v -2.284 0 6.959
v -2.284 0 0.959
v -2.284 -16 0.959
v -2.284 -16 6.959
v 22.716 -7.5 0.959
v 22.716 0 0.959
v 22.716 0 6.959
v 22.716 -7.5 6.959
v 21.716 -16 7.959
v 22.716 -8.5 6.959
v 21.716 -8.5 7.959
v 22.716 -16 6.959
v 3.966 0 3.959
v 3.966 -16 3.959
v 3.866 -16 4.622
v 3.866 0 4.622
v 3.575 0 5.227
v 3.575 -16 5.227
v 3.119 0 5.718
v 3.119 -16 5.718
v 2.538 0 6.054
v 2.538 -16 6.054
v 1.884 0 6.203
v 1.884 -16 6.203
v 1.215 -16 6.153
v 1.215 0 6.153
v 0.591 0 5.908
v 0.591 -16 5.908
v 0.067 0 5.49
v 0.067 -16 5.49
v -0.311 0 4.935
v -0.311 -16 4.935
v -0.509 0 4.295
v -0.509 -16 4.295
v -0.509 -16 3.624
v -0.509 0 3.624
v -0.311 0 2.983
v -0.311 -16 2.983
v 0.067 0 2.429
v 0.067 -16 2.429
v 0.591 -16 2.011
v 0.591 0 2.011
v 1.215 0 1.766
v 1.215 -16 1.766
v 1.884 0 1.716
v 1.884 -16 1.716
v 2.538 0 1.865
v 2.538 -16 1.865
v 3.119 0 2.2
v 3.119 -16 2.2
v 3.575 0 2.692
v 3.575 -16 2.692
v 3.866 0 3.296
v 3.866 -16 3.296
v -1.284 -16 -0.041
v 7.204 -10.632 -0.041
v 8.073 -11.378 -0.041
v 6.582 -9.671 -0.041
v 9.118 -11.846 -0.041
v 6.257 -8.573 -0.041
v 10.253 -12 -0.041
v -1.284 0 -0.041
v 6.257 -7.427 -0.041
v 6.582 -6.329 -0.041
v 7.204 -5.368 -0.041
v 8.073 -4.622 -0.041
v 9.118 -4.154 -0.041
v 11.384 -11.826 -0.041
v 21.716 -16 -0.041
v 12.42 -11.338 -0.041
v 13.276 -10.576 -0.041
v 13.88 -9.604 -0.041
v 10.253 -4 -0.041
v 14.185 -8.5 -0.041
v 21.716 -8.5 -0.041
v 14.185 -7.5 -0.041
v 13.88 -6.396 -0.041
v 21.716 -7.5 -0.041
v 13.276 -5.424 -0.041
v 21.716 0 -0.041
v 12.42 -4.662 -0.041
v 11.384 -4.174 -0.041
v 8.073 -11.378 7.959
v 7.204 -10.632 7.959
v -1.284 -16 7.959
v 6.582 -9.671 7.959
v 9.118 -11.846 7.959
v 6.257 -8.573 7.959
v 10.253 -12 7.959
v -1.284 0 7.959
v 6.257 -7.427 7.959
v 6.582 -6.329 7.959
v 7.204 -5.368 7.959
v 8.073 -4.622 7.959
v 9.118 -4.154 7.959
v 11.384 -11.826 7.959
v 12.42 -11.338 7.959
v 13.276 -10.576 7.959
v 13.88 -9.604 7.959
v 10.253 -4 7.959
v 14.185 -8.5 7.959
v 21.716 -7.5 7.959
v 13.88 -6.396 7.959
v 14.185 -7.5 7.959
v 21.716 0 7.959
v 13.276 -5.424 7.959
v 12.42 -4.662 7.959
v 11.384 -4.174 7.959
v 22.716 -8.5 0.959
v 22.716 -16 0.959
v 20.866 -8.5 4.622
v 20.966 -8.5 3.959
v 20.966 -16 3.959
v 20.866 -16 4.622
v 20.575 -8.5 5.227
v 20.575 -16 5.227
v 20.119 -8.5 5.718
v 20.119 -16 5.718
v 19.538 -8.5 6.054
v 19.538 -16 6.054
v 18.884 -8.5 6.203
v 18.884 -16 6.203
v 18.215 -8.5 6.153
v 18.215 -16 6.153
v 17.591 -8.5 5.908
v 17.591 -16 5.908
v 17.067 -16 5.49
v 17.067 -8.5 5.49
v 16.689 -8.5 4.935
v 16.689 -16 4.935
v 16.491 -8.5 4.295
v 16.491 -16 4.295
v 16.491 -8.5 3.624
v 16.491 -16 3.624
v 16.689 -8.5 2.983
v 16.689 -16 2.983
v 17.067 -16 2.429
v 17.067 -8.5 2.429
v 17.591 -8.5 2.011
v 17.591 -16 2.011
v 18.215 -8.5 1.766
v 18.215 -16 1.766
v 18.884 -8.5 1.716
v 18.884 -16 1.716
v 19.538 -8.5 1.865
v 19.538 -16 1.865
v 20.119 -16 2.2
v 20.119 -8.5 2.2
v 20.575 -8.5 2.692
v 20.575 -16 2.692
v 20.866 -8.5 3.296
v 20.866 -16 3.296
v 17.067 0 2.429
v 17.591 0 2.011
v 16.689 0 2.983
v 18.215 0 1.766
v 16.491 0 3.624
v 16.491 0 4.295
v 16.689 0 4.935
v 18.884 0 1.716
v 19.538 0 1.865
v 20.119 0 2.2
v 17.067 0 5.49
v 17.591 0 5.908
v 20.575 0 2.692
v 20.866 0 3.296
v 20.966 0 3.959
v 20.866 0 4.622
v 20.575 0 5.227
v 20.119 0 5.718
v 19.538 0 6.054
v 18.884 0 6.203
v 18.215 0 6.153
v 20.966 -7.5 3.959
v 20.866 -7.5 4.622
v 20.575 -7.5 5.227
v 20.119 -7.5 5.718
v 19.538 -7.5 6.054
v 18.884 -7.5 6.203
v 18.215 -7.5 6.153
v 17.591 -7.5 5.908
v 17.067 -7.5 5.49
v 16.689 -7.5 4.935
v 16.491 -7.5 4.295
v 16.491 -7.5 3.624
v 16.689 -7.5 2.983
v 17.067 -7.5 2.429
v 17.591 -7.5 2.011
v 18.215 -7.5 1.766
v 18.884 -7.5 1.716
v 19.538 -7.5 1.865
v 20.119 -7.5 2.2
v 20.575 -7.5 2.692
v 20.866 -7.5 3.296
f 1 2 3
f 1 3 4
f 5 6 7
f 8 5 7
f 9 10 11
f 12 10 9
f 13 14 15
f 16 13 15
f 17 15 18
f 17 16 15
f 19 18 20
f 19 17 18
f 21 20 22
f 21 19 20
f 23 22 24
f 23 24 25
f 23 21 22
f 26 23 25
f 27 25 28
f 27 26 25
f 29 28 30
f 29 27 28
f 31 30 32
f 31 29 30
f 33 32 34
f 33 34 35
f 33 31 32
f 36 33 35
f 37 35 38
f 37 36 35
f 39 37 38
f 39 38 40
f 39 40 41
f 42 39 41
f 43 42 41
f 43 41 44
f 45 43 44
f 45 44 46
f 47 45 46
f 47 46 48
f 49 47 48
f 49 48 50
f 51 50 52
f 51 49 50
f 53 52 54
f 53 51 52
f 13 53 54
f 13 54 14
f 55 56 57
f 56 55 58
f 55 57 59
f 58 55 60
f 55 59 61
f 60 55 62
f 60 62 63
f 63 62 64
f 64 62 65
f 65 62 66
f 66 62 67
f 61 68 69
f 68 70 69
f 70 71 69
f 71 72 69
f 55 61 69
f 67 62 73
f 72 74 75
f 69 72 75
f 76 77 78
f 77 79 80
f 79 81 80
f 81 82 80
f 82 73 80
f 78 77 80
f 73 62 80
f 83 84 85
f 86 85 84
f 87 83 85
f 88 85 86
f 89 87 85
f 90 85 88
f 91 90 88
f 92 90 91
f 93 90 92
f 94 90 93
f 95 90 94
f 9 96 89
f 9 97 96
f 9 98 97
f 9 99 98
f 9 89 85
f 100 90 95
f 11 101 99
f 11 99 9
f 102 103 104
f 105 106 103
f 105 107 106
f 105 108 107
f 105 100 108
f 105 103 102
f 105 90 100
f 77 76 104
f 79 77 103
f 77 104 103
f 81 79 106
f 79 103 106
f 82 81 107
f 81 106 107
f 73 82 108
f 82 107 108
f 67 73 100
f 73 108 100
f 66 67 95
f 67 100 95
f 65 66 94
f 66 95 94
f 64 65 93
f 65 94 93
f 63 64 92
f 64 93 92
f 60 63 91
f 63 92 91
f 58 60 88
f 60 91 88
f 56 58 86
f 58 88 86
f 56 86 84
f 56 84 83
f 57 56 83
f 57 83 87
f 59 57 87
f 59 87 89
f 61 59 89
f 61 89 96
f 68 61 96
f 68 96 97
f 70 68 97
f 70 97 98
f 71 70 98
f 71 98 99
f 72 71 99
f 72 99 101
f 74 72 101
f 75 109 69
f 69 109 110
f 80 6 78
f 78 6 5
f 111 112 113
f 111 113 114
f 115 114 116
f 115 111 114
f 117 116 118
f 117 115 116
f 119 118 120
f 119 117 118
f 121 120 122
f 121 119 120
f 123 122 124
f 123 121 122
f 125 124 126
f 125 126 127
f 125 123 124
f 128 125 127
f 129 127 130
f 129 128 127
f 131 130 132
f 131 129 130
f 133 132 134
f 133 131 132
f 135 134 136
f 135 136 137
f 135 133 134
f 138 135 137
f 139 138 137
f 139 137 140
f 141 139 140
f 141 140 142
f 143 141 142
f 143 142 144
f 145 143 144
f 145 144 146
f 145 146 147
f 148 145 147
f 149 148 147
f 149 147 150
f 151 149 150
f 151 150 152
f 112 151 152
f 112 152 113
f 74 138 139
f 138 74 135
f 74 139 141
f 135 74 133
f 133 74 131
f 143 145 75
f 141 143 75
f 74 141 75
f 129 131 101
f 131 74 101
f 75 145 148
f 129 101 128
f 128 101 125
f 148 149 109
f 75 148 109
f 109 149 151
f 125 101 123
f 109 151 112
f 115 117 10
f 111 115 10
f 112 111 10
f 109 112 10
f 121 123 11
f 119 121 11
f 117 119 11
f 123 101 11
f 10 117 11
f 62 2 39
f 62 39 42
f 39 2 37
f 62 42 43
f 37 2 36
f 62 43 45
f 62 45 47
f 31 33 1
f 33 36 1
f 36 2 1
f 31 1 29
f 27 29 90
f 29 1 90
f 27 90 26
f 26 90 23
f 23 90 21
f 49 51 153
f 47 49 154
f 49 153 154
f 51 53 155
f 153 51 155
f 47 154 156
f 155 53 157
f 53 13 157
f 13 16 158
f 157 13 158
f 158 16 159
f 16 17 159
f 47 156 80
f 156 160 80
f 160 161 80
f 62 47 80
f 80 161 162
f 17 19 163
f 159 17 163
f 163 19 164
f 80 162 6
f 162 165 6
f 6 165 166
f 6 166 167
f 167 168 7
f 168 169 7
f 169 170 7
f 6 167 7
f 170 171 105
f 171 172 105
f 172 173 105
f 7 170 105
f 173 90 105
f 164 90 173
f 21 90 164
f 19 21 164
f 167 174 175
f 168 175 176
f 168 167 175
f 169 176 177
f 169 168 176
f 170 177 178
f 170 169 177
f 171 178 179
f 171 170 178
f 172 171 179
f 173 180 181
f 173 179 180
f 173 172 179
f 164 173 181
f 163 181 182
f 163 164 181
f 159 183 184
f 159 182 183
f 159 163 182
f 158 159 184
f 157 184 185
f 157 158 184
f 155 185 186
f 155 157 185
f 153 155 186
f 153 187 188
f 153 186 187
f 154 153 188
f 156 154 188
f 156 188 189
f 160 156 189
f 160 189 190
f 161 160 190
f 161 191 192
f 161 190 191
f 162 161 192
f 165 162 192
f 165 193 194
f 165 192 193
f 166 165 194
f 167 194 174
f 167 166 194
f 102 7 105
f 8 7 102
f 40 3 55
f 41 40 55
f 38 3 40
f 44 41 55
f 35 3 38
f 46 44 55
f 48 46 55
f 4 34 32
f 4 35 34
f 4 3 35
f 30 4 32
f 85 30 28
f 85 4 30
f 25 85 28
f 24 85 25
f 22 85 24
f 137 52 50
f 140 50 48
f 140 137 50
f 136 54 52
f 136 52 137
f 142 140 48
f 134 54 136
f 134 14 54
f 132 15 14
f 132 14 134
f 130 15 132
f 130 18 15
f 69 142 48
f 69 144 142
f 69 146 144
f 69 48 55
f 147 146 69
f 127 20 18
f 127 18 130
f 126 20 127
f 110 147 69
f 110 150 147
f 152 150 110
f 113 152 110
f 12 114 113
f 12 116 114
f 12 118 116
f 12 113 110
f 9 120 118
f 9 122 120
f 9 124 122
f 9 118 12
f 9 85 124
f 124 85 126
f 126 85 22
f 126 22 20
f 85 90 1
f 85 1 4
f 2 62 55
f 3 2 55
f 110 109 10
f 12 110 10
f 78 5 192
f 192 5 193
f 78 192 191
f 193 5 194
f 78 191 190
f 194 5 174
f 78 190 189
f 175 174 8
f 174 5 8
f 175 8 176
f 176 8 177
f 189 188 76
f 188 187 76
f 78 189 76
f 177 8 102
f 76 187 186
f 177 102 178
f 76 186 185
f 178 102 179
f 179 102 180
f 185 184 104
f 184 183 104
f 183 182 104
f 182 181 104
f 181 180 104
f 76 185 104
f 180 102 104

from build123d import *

# Parameters (mm, degrees)
F0_W     = 25
F0_H     = 8
F0_R     = 2.25
F1_DEPTH = 16
F2_R     = 4
F3_DEPTH = 25
F4_SIZE  = 1
F6_DEPTH = 25


with BuildPart() as f1:
    # F0 (on Front) → F1 (new body)
    with BuildSketch(Plane.XZ):
        with Locations((10.216074, 3.959236)):
            Rectangle(F0_W, F0_H)
        with Locations((1.716074, 3.959236)):
            Circle(F0_R, mode=Mode.SUBTRACT)
        with Locations((18.716074, 3.959236)):
            Circle(F0_R, mode=Mode.SUBTRACT)
    extrude(amount=F1_DEPTH)

    # F2 (on face) → F3 (cut)
    with BuildSketch(Plane.XY.offset(7.959236)):
        with Locations((10.216074, -8)):
            Circle(F2_R)
    extrude(amount=-F3_DEPTH, mode=Mode.SUBTRACT)

    # F4
    f4_edges = [f1.edges().sort_by_distance(p)[0] for p in [
        (22.716074, -8, 7.959236),
        (22.716074, -8, -0.040764),
        (-2.283926, -8, 7.959236),
        (-2.283926, -8, -0.040764),
    ]]
    chamfer(f4_edges, length=F4_SIZE)

    # F5 (on face) → F6 (cut)
    with BuildSketch(Plane.XY.offset(7.959236)):
        with BuildLine():
            Line((22.760317, -7.5), (14.184701, -7.5))
            ThreePointArc((14.184701, -7.5), (14.216074, -8), (14.184701, -8.5))
            Line((14.184701, -8.5), (22.760317, -8.5))
            Line((22.760317, -8.5), (22.760317, -7.5))
        make_face()
    extrude(amount=-F6_DEPTH, mode=Mode.SUBTRACT)


solid = f1.part
